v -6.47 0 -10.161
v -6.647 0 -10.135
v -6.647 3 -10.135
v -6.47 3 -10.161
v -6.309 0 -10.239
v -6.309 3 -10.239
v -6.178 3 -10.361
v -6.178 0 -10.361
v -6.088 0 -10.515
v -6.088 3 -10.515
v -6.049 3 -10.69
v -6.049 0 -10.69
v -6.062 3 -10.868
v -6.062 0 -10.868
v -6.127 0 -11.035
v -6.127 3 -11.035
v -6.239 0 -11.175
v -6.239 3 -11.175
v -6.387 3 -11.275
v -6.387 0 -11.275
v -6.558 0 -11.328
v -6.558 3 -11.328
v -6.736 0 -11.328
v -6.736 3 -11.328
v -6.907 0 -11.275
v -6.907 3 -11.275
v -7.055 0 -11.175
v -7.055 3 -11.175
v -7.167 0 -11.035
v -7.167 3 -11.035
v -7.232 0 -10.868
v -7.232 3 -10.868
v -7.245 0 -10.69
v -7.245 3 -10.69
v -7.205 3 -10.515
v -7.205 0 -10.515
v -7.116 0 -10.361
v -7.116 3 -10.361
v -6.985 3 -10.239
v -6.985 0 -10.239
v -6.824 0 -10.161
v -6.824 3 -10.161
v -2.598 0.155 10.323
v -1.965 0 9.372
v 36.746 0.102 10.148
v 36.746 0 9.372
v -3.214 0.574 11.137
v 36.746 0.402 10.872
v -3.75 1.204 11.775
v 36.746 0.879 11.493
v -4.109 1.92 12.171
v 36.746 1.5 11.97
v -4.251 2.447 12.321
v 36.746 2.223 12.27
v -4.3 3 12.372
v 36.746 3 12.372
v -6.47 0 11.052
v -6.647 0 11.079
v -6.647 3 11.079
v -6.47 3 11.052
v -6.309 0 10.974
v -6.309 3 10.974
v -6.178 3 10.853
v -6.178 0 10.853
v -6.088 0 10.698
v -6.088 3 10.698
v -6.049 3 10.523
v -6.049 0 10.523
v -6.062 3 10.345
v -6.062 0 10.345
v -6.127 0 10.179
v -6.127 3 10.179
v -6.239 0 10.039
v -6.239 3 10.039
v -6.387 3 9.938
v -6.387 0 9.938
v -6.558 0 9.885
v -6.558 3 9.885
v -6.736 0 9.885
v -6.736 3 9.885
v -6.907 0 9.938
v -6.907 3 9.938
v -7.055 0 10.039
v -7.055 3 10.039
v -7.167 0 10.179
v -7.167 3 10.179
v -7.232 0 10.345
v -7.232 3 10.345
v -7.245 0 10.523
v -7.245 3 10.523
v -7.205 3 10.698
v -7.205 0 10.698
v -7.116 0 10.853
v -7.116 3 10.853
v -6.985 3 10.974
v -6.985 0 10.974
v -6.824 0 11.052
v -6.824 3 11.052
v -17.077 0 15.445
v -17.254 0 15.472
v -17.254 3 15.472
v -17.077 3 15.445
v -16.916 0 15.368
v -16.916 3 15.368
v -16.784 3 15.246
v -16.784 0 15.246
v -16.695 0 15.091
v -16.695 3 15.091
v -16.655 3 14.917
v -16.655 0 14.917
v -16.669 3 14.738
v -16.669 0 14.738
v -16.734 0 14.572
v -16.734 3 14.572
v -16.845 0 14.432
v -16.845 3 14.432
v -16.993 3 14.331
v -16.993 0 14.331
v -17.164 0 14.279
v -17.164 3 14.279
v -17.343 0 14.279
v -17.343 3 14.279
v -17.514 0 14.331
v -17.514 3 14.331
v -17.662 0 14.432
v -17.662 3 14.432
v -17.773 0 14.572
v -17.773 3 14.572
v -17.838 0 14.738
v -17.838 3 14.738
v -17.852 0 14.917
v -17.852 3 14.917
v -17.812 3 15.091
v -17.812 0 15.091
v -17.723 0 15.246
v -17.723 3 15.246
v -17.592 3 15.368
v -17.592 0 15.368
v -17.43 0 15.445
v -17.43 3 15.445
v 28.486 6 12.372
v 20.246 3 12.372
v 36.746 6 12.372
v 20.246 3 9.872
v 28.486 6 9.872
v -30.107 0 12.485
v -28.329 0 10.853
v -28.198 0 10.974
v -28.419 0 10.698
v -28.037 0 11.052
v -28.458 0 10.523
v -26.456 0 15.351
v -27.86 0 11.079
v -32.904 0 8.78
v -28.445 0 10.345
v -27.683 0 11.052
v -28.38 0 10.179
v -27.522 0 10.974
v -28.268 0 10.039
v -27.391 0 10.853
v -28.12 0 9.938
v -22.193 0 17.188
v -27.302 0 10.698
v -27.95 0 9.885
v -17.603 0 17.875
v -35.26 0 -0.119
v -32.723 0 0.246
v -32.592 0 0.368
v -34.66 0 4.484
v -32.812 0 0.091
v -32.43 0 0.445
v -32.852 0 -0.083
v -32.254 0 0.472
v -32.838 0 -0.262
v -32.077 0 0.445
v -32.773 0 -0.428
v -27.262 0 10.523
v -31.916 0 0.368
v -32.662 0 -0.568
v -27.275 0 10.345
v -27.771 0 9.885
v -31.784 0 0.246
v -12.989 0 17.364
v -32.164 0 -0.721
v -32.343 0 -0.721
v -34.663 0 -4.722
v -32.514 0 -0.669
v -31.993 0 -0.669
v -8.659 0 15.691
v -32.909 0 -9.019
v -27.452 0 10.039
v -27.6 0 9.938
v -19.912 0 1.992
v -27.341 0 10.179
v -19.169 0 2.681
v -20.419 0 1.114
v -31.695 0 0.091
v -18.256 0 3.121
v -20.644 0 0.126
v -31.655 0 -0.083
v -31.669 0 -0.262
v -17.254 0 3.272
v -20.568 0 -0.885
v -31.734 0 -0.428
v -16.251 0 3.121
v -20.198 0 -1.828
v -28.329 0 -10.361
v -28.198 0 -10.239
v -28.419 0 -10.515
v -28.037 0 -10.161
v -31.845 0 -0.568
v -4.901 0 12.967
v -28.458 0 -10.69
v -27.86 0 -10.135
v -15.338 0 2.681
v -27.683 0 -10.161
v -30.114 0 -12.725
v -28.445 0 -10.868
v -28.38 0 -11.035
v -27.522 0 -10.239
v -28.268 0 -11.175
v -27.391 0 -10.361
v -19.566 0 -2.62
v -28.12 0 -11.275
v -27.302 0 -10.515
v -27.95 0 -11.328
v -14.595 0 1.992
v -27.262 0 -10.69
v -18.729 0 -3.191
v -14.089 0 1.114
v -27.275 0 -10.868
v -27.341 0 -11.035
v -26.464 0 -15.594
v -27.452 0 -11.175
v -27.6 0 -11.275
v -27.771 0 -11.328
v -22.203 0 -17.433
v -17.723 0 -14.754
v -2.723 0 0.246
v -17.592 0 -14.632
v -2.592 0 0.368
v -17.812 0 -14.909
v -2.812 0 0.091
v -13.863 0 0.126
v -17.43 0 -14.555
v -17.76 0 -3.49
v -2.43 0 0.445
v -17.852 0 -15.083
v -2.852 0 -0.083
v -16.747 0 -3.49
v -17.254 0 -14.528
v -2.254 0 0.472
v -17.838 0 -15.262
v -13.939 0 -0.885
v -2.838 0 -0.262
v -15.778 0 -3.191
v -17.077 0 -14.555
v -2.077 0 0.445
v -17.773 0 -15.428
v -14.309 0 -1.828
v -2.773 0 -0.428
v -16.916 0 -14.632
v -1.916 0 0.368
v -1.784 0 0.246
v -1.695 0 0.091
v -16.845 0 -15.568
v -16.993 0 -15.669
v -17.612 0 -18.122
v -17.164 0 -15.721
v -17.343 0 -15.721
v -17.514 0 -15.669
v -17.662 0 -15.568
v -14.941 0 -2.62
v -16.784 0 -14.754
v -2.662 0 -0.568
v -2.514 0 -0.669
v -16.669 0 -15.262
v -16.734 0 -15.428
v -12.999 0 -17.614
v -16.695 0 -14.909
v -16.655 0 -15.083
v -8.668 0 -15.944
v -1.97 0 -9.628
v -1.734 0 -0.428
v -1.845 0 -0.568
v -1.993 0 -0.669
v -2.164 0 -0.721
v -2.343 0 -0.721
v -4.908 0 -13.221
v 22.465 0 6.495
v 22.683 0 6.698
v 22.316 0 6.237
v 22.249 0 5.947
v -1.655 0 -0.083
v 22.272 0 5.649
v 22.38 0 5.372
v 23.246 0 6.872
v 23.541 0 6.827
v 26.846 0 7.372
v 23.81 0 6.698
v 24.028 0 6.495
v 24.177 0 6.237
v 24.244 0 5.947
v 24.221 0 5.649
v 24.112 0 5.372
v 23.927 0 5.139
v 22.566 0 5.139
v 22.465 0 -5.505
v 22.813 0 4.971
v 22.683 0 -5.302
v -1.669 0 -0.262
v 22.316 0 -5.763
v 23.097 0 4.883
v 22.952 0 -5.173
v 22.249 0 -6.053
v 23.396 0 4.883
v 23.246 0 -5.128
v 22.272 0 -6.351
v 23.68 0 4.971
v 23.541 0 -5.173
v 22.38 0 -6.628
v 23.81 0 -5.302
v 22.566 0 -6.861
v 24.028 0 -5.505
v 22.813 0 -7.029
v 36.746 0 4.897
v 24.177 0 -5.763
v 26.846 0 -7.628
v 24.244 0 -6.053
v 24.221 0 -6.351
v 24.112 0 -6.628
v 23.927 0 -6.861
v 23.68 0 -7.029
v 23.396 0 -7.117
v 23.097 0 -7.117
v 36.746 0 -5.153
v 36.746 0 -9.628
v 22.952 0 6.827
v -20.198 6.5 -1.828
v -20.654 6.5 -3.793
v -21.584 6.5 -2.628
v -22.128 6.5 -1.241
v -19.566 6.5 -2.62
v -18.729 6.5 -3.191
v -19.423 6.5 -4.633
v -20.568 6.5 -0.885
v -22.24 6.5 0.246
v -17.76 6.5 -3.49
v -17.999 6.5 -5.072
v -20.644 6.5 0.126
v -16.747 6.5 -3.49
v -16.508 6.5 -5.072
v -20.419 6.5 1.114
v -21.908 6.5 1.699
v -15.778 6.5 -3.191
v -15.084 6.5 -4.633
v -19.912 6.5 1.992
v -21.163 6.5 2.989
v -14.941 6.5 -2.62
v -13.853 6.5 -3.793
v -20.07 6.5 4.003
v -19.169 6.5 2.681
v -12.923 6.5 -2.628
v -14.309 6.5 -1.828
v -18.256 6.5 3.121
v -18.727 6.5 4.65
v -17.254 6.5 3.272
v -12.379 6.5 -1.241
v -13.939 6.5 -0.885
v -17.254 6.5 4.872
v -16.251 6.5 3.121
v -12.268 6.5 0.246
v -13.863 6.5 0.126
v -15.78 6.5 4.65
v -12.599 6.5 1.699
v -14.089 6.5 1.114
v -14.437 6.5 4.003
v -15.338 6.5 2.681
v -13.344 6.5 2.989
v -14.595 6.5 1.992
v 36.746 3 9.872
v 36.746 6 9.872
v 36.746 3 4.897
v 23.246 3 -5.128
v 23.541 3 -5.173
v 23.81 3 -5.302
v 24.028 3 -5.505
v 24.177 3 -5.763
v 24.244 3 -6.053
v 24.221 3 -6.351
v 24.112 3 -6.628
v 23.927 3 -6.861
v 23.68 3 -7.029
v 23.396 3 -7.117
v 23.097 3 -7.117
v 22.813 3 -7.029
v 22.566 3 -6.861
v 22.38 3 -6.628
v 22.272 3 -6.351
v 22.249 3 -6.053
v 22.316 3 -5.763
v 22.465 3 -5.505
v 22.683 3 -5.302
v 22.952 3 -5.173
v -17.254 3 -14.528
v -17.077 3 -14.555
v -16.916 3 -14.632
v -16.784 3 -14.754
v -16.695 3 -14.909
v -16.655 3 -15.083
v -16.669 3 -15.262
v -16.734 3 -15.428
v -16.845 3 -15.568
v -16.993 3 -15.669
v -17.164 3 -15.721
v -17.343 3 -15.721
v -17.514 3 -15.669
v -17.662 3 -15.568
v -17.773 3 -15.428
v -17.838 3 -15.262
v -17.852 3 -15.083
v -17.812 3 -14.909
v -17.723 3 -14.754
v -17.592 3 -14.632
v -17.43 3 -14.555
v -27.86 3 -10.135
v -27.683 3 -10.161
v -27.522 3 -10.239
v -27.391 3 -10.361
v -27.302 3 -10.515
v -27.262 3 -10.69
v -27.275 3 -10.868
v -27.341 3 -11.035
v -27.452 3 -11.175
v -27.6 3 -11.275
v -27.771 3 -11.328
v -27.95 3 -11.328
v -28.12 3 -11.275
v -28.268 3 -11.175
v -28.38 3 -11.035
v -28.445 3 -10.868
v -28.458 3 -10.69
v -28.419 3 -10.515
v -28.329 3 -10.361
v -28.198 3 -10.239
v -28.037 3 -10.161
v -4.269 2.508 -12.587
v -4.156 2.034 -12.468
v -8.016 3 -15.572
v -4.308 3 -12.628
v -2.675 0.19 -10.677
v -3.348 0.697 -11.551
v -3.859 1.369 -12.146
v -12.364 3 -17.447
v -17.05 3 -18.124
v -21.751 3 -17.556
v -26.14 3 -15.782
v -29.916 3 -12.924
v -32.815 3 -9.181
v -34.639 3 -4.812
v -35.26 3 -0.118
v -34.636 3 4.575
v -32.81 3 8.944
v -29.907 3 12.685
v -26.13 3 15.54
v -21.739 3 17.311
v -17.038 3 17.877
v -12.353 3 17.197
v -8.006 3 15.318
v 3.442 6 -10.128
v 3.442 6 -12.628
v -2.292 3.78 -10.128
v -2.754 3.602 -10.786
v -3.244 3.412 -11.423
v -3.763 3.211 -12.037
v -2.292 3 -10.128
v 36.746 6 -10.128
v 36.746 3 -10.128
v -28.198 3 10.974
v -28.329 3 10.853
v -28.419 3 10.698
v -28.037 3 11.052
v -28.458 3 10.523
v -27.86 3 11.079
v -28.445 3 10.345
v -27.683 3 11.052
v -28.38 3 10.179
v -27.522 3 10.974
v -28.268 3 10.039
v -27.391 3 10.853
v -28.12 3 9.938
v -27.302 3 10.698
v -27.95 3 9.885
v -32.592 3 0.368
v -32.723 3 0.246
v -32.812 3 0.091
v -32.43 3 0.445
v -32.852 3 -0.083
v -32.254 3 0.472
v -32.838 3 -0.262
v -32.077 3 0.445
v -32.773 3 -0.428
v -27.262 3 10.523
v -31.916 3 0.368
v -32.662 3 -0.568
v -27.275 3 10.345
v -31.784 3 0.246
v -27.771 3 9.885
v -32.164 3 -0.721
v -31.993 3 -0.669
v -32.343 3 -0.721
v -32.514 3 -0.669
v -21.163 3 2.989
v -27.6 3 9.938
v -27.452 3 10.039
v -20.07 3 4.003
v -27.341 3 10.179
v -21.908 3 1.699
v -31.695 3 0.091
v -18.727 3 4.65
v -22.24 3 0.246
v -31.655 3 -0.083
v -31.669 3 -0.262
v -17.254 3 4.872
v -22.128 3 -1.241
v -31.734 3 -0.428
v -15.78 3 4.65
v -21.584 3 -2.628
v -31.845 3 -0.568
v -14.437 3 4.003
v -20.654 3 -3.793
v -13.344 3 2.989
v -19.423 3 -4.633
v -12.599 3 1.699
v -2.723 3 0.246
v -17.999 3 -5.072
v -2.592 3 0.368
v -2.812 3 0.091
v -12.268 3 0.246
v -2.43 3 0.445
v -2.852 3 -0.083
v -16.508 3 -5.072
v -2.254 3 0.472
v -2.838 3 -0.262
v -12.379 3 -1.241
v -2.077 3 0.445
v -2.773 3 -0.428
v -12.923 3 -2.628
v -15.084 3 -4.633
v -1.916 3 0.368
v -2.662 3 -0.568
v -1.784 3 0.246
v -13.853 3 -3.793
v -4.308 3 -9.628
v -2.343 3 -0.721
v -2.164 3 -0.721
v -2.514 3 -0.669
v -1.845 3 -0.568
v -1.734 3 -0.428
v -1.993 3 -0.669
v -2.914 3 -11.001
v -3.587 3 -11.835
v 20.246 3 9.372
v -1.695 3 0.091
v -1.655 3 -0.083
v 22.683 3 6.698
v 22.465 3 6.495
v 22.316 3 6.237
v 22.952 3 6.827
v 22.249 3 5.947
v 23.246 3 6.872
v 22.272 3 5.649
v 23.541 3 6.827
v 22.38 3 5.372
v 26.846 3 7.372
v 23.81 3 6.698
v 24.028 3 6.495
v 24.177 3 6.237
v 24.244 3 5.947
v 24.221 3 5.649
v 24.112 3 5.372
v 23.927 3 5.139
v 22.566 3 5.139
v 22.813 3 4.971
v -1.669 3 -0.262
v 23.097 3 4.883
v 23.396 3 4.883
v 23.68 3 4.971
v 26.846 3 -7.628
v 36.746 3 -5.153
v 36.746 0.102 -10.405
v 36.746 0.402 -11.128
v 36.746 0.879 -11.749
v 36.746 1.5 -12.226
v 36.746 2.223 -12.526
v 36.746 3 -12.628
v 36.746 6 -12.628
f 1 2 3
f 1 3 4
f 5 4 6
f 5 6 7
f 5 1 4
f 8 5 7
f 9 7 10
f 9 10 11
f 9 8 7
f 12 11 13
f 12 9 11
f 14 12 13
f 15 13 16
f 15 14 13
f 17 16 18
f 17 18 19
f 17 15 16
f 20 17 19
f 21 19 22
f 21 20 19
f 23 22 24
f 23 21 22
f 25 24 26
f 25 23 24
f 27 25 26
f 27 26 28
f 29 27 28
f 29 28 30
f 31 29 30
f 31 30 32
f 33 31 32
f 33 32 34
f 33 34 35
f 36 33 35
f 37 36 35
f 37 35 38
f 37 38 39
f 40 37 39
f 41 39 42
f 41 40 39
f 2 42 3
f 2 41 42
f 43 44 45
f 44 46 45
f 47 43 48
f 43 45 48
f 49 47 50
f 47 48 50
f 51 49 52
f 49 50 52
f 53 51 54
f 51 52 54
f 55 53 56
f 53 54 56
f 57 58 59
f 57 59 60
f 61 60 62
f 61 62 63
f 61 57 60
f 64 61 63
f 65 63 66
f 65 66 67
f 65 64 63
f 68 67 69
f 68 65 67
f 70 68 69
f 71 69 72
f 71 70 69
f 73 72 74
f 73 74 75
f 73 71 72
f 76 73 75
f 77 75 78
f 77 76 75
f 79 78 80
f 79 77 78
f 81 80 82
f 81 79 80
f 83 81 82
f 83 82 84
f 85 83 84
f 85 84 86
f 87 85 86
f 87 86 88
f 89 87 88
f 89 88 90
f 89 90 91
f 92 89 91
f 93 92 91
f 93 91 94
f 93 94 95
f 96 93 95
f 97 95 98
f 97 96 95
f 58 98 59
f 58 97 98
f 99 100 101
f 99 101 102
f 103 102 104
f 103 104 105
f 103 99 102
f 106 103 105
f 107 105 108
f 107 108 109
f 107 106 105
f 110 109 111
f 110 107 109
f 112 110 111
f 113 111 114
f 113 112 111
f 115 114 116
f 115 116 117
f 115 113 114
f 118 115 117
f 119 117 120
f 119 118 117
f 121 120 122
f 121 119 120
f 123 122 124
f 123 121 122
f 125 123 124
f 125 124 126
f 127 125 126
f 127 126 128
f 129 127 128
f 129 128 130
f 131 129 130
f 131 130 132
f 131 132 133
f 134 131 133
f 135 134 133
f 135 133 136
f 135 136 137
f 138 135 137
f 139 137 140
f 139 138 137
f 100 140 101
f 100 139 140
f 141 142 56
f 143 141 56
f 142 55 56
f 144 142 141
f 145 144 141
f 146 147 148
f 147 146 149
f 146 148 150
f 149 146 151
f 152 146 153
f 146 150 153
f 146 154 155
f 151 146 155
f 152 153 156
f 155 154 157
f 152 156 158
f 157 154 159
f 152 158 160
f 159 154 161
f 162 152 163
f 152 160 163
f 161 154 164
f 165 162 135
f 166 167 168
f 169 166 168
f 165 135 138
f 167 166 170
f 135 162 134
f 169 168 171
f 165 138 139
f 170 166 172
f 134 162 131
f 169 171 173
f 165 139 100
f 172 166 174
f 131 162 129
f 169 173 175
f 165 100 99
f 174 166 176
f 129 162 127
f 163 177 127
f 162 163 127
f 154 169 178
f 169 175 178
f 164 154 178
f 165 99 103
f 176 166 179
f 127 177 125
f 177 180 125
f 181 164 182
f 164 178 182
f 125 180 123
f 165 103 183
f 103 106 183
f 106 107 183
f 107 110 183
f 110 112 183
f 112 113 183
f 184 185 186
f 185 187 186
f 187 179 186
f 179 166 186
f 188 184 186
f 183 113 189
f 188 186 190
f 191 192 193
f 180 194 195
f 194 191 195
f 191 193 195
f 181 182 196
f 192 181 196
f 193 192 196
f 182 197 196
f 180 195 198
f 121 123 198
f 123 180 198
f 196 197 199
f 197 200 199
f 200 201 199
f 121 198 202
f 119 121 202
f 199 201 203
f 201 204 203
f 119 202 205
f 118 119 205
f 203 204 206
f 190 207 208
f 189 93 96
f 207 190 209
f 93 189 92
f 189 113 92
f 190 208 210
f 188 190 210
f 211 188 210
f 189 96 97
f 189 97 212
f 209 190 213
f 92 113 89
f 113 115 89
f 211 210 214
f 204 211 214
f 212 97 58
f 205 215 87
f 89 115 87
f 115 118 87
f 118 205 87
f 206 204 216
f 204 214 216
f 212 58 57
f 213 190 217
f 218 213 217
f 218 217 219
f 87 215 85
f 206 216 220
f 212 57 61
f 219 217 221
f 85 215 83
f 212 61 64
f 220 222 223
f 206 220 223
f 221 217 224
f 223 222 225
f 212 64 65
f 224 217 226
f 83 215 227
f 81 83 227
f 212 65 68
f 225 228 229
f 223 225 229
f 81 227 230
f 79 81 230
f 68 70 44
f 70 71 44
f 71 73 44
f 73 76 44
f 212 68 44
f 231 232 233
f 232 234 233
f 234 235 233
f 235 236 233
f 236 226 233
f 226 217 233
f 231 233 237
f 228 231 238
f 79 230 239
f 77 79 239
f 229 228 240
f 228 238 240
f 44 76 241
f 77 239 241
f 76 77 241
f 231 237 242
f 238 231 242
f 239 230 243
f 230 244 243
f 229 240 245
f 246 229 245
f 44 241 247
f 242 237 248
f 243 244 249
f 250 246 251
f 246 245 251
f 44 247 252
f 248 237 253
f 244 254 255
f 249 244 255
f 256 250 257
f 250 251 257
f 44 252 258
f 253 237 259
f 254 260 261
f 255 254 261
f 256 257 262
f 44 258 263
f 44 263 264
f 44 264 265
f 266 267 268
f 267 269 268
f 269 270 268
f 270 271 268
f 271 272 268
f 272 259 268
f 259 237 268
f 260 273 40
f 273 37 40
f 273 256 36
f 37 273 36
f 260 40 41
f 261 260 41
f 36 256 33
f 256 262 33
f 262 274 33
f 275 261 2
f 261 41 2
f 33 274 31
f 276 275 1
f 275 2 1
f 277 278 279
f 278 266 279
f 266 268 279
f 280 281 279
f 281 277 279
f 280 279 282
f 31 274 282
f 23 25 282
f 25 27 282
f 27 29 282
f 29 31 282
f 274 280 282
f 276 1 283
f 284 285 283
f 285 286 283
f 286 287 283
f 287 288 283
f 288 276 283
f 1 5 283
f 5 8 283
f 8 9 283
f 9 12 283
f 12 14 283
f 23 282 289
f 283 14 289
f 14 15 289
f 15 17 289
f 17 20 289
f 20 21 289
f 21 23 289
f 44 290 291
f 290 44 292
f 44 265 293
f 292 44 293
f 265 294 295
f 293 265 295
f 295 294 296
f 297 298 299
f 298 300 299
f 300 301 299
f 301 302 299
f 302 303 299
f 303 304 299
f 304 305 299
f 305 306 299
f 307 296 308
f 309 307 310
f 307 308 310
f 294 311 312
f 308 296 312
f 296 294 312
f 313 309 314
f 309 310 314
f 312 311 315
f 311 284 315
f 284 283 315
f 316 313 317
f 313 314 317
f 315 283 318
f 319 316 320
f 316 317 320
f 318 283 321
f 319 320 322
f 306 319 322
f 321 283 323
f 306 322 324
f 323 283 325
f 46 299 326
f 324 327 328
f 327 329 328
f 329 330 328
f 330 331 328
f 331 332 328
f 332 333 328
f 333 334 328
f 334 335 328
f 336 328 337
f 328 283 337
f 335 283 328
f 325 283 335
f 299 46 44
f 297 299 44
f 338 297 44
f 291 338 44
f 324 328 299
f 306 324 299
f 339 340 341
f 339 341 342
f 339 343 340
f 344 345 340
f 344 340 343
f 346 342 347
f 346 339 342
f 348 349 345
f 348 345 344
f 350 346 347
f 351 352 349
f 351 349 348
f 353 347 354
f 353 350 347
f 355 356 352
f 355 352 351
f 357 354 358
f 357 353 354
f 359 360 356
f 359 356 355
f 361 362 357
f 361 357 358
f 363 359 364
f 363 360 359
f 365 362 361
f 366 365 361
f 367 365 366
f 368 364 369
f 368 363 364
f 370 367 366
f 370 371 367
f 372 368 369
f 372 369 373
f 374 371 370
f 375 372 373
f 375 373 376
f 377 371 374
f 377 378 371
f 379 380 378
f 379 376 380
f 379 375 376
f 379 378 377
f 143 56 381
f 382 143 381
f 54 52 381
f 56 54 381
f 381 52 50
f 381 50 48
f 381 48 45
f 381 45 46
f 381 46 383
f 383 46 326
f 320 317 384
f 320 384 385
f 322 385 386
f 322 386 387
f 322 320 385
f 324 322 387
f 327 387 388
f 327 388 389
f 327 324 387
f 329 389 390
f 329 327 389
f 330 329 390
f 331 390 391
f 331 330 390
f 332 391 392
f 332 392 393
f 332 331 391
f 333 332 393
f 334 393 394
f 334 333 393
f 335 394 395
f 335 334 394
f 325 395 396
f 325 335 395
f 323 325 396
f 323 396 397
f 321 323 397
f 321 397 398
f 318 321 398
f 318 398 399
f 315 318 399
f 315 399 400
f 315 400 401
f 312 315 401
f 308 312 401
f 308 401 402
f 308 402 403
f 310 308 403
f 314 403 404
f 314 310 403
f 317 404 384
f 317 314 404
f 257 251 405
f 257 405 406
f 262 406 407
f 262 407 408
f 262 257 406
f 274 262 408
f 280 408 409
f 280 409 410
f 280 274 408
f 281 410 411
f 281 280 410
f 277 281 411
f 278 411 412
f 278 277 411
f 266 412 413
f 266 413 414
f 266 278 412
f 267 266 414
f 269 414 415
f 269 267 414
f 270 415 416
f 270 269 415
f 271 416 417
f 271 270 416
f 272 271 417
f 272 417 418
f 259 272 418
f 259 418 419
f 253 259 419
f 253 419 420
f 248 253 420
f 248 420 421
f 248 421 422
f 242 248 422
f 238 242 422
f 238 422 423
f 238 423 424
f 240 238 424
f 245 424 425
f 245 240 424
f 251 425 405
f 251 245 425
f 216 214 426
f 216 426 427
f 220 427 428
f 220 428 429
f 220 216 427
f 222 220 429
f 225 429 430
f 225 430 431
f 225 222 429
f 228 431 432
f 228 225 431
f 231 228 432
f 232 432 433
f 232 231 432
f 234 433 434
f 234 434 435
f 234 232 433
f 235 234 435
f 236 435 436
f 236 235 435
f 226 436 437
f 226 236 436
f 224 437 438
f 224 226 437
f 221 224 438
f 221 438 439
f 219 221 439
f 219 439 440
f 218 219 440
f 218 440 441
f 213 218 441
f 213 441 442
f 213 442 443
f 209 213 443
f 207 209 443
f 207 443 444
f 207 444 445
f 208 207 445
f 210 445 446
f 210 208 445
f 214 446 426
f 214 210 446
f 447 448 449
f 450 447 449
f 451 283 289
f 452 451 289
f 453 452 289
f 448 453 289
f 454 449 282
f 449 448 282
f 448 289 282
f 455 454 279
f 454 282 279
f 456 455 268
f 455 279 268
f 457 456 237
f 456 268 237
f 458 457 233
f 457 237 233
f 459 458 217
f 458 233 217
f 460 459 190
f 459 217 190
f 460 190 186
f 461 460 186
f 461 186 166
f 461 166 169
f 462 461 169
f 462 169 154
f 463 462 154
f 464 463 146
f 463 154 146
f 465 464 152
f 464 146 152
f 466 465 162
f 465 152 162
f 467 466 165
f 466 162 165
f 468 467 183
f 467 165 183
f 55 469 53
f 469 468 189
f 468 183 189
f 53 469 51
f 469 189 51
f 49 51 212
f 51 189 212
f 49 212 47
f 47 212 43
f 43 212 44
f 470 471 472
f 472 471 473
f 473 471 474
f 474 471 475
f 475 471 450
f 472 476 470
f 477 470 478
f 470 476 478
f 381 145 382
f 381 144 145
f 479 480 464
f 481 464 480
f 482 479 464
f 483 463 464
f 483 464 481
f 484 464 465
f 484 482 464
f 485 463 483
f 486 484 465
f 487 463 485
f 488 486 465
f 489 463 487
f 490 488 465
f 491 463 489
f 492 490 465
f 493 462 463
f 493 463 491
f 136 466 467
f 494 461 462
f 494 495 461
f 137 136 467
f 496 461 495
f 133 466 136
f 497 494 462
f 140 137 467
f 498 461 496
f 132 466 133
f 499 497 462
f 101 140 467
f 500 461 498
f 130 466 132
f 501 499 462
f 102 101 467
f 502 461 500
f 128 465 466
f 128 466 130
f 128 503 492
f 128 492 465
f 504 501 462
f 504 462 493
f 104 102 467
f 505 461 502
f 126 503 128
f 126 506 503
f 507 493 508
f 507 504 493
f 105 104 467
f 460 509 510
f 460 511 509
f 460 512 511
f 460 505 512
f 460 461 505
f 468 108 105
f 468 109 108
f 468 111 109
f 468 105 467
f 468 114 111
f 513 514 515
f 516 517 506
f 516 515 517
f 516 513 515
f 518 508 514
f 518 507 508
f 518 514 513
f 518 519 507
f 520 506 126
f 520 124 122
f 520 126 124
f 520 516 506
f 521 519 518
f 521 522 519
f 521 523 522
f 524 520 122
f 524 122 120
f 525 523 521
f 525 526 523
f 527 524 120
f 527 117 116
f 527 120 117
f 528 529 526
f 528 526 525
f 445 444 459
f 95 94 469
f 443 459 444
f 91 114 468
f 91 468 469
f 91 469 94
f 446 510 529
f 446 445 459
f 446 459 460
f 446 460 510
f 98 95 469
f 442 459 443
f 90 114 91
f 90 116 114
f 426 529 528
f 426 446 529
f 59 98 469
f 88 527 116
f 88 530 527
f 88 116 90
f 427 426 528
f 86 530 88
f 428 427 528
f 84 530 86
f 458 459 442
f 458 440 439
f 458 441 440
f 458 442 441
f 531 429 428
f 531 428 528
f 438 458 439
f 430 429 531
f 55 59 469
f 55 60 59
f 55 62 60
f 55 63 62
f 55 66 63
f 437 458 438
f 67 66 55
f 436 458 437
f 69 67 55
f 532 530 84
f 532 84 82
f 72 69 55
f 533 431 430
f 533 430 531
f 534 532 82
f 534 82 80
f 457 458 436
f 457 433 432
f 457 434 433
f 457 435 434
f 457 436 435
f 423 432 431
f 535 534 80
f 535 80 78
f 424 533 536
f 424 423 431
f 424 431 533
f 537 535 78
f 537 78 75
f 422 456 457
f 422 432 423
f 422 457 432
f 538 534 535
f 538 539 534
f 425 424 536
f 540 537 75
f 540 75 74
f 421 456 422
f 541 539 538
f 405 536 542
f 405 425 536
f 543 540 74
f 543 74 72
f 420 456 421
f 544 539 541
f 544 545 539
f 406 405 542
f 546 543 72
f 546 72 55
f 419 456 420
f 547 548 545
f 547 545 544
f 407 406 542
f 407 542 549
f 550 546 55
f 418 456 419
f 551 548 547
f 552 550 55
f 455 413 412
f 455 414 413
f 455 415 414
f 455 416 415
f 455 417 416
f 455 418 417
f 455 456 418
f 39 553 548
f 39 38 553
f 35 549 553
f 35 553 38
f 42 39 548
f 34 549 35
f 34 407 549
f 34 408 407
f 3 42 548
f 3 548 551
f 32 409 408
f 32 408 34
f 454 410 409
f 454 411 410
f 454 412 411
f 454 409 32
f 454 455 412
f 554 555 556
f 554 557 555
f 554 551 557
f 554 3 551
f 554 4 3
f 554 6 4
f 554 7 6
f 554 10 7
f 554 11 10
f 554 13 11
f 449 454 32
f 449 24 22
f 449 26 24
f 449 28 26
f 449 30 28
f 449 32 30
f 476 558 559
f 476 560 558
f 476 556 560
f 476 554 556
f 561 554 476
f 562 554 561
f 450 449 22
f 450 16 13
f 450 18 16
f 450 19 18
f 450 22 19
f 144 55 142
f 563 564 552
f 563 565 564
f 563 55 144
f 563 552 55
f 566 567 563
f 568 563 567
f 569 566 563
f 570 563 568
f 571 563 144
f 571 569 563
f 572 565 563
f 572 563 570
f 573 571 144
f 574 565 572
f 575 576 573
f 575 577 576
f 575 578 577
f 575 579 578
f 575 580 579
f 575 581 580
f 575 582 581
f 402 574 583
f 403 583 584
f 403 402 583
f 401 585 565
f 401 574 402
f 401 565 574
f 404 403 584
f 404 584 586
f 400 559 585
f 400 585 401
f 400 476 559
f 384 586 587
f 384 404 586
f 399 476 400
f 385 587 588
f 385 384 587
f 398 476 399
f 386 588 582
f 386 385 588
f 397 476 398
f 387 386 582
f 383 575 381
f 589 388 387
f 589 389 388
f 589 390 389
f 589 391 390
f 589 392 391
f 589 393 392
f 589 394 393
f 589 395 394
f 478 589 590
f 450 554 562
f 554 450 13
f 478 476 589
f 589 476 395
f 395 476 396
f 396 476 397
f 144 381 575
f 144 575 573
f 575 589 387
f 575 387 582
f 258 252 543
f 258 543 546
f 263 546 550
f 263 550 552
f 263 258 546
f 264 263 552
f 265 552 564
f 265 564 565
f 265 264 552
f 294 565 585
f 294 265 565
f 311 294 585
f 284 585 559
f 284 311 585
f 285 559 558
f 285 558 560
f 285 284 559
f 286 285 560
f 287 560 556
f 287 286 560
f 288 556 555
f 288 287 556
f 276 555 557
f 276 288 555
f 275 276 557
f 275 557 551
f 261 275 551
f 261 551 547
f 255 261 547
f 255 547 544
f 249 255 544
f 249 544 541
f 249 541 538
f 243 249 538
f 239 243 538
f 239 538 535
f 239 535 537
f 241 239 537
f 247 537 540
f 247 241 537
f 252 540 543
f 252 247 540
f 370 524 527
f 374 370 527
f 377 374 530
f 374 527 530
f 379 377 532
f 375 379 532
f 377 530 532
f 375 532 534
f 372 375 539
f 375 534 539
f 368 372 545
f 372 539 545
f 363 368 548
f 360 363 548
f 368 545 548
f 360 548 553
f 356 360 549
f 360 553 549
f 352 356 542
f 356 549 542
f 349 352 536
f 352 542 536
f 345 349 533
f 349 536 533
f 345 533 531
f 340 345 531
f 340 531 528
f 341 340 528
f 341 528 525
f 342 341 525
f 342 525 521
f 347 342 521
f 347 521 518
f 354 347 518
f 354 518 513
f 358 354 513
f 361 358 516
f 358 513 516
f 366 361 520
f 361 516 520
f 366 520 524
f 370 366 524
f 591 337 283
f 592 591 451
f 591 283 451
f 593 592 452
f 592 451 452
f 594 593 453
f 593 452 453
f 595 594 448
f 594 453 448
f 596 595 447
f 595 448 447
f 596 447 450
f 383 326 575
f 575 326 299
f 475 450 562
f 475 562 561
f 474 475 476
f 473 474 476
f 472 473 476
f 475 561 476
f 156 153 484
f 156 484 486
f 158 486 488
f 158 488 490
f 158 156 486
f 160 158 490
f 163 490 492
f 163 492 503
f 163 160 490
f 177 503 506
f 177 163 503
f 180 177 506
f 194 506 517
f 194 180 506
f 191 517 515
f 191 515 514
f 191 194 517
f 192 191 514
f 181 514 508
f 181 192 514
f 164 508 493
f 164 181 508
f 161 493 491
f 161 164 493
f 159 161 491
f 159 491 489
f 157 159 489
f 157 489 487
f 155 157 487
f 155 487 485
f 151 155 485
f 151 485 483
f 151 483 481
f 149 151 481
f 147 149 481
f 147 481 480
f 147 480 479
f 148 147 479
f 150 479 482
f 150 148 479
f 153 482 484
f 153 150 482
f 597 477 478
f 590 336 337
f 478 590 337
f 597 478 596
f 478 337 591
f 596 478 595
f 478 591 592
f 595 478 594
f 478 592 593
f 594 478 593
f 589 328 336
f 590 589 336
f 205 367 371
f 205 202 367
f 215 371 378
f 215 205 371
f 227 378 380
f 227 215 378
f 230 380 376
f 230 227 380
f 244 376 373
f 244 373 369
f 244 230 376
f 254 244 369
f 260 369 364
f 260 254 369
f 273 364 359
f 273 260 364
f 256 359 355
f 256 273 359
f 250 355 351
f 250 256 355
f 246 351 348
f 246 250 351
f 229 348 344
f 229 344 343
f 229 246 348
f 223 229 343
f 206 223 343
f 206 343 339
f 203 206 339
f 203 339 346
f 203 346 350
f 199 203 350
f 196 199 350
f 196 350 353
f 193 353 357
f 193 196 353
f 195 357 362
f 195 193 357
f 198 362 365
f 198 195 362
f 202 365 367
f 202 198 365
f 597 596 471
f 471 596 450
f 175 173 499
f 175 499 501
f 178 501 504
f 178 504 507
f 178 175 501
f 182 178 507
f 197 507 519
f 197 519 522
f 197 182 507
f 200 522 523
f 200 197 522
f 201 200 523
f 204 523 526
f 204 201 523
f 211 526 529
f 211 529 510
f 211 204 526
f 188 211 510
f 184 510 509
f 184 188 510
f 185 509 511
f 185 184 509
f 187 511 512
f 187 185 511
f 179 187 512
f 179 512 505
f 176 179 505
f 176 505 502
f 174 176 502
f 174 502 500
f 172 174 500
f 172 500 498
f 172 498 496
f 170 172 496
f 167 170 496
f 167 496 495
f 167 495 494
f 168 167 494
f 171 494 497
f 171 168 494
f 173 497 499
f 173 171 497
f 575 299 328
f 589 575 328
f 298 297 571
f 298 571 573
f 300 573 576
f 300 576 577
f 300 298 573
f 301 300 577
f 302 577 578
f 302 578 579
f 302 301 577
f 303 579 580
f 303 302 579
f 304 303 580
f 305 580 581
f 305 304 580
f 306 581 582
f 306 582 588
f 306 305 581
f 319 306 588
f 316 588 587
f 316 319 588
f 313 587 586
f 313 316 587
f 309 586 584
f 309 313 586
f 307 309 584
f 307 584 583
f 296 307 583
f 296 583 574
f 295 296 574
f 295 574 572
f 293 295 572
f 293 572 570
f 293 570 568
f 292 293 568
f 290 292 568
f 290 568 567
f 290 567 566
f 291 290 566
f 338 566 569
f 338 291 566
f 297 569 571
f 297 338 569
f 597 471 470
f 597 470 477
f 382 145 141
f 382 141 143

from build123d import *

# Parameters (mm, degrees)
CROQUIS1_R              = 3.399999868
CROQUIS1_R_2            = 0.599999638
CROQUIS1_R_3            = 0.999999893
CROQUIS1_R_4            = 1.000000486
SALIENTE_EXTRUIR1_DEPTH = 3
CROQUIS2_W              = 16.5
CROQUIS2_H              = 2.5
SALIENTE_EXTRUIR2_DEPTH = 3
CORTAR_EXTRUIR1_DEPTH   = 3
CORTAR_EXTRUIR2_DEPTH   = 3
CROQUIS5_R              = 5
CROQUIS5_R_2            = 3.399999868
SALIENTE_EXTRUIR3_DEPTH = 3.5
REDONDEO1_R             = 3


with BuildPart() as part:
    # Croquis1 → Saliente-Extruir1 (new body)
    with BuildSketch(Plane(origin=(0, 0, 0), x_dir=(1, 0, 0), z_dir=(0, 1, 0))):
        with BuildLine():
            Line((36.746468572, 5.153075413), (36.746468572, 12.628075318))
            Line((36.746468572, 12.628075318), (-4.308066759, 12.628075318))
            ThreePointArc((-4.308066759, 12.628075318), (-35.260081681, 0.11801537), (-4.299942386, -12.371924682))
            Line((-4.299942386, -12.371924682), (36.746468572, -12.371924682))
            Line((36.746468572, -12.371924682), (36.746468572, -4.896924777))
            Line((36.746468572, -4.896924777), (26.846467047, -7.371924682))
            Line((26.846467047, -7.371924682), (26.846467047, 7.628075318))
            Line((26.846467047, 7.628075318), (36.746468572, 5.153075413))
        make_face()
        with Locations(Location((-17.253531302, 0.128075481, 0), (0, 0, 270))):
            Circle(CROQUIS1_R, mode=Mode.SUBTRACT)
        with Locations(Location((-17.253531676, 15.128075105, 0), (0, 0, 270))):
            Circle(CROQUIS1_R_2, mode=Mode.SUBTRACT)
        with Locations(Location((23.24646788, 6.128075095, 0), (0, 0, 270))):
            Circle(CROQUIS1_R_3, mode=Mode.SUBTRACT)
        with Locations(Location((23.246467992, -5.871925124, 0), (0, 0, 270))):
            Circle(CROQUIS1_R_4, mode=Mode.SUBTRACT)
        with Locations(Location((-6.646930036, 10.734677061, 0), (0, 0, 270))):
            Circle(CROQUIS1_R_2, mode=Mode.SUBTRACT)
        with Locations(Location((-2.25353164, 0.128075566, 0), (0, 0, 270))):
            Circle(CROQUIS1_R_2, mode=Mode.SUBTRACT)
        with Locations(Location((-6.646929684, -10.478526074, 0), (0, 0, 270))):
            Circle(CROQUIS1_R_2, mode=Mode.SUBTRACT)
        with Locations(Location((-17.253531179, -14.871924469, 0), (0, 0, 270))):
            Circle(CROQUIS1_R_2, mode=Mode.SUBTRACT)
        with Locations(Location((-27.860132819, -10.478526425, 0), (0, 0, 270))):
            Circle(CROQUIS1_R_2, mode=Mode.SUBTRACT)
        with Locations(Location((-32.253531215, 0.12807507, 0), (0, 0, 270))):
            Circle(CROQUIS1_R_2, mode=Mode.SUBTRACT)
        with Locations(Location((-27.860133171, 10.73467671, 0), (0, 0, 270))):
            Circle(CROQUIS1_R_2, mode=Mode.SUBTRACT)
    extrude(amount=SALIENTE_EXTRUIR1_DEPTH)

    # Croquis2 → Saliente-Extruir2 (add)
    with BuildSketch(Plane(origin=(0, 3, 0), x_dir=(1, 0, 0), z_dir=(0, 1, 0))):
        with BuildLine():
            Line((36.746468572, 12.628075318), (-4.308066759, 12.628075318))
            ThreePointArc((-4.308066759, 12.628075318), (-3.24436155, 11.423127984), (-2.292413315, 10.128075318))
            Line((-2.292413315, 10.128075318), (36.746468572, 10.128075318))
            Line((36.746468572, 10.128075318), (36.746468572, 12.628075318))
        make_face()
        with Locations((28.496468572, -11.121924682)):
            Rectangle(CROQUIS2_W, CROQUIS2_H)
    extrude(amount=SALIENTE_EXTRUIR2_DEPTH)

    # Croquis3 → Cortar-Extruir1 (cut)
    with BuildSketch(Plane.XY.offset(12.371924682)):
        Polygon((20.246468572, 3), (28.486468572, 6), (20.246468572, 6), align=None)
    extrude(amount=-CORTAR_EXTRUIR1_DEPTH, mode=Mode.SUBTRACT)

    # Croquis4 → Cortar-Extruir2 (cut)
    with BuildSketch(Plane(origin=(0, 0, -12.628075318), x_dir=(-1, 0, 0), z_dir=(0, 0, -1))):
        Polygon((4.308066759, 3), (4.308066759, 6), (-3.441933241, 6), align=None)
    extrude(amount=-CORTAR_EXTRUIR2_DEPTH, mode=Mode.SUBTRACT)

    # Croquis5 → Saliente-Extruir3 (add)
    with BuildSketch(Plane(origin=(0, 3, 0), x_dir=(1, 0, 0), z_dir=(0, 1, 0))):
        with Locations(Location((-17.253531302, 0.128075481, 0), (0, 0, 270))):
            Circle(CROQUIS5_R)
        with Locations(Location((-17.253531302, 0.128075481, 0), (0, 0, 270))):
            Circle(CROQUIS5_R_2, mode=Mode.SUBTRACT)
    extrude(amount=SALIENTE_EXTRUIR3_DEPTH)

    # Redondeo1
    redondeo1_edges = [part.edges().sort_by_distance(p)[0] for p in [
        (16.219200907, 0, -12.628075318),
        (16.223263093, 0, 12.371924682),
    ]]
    fillet(redondeo1_edges, radius=REDONDEO1_R - 0.0001)  # a hair under: the kernel refuses the full size


solid = part.part
